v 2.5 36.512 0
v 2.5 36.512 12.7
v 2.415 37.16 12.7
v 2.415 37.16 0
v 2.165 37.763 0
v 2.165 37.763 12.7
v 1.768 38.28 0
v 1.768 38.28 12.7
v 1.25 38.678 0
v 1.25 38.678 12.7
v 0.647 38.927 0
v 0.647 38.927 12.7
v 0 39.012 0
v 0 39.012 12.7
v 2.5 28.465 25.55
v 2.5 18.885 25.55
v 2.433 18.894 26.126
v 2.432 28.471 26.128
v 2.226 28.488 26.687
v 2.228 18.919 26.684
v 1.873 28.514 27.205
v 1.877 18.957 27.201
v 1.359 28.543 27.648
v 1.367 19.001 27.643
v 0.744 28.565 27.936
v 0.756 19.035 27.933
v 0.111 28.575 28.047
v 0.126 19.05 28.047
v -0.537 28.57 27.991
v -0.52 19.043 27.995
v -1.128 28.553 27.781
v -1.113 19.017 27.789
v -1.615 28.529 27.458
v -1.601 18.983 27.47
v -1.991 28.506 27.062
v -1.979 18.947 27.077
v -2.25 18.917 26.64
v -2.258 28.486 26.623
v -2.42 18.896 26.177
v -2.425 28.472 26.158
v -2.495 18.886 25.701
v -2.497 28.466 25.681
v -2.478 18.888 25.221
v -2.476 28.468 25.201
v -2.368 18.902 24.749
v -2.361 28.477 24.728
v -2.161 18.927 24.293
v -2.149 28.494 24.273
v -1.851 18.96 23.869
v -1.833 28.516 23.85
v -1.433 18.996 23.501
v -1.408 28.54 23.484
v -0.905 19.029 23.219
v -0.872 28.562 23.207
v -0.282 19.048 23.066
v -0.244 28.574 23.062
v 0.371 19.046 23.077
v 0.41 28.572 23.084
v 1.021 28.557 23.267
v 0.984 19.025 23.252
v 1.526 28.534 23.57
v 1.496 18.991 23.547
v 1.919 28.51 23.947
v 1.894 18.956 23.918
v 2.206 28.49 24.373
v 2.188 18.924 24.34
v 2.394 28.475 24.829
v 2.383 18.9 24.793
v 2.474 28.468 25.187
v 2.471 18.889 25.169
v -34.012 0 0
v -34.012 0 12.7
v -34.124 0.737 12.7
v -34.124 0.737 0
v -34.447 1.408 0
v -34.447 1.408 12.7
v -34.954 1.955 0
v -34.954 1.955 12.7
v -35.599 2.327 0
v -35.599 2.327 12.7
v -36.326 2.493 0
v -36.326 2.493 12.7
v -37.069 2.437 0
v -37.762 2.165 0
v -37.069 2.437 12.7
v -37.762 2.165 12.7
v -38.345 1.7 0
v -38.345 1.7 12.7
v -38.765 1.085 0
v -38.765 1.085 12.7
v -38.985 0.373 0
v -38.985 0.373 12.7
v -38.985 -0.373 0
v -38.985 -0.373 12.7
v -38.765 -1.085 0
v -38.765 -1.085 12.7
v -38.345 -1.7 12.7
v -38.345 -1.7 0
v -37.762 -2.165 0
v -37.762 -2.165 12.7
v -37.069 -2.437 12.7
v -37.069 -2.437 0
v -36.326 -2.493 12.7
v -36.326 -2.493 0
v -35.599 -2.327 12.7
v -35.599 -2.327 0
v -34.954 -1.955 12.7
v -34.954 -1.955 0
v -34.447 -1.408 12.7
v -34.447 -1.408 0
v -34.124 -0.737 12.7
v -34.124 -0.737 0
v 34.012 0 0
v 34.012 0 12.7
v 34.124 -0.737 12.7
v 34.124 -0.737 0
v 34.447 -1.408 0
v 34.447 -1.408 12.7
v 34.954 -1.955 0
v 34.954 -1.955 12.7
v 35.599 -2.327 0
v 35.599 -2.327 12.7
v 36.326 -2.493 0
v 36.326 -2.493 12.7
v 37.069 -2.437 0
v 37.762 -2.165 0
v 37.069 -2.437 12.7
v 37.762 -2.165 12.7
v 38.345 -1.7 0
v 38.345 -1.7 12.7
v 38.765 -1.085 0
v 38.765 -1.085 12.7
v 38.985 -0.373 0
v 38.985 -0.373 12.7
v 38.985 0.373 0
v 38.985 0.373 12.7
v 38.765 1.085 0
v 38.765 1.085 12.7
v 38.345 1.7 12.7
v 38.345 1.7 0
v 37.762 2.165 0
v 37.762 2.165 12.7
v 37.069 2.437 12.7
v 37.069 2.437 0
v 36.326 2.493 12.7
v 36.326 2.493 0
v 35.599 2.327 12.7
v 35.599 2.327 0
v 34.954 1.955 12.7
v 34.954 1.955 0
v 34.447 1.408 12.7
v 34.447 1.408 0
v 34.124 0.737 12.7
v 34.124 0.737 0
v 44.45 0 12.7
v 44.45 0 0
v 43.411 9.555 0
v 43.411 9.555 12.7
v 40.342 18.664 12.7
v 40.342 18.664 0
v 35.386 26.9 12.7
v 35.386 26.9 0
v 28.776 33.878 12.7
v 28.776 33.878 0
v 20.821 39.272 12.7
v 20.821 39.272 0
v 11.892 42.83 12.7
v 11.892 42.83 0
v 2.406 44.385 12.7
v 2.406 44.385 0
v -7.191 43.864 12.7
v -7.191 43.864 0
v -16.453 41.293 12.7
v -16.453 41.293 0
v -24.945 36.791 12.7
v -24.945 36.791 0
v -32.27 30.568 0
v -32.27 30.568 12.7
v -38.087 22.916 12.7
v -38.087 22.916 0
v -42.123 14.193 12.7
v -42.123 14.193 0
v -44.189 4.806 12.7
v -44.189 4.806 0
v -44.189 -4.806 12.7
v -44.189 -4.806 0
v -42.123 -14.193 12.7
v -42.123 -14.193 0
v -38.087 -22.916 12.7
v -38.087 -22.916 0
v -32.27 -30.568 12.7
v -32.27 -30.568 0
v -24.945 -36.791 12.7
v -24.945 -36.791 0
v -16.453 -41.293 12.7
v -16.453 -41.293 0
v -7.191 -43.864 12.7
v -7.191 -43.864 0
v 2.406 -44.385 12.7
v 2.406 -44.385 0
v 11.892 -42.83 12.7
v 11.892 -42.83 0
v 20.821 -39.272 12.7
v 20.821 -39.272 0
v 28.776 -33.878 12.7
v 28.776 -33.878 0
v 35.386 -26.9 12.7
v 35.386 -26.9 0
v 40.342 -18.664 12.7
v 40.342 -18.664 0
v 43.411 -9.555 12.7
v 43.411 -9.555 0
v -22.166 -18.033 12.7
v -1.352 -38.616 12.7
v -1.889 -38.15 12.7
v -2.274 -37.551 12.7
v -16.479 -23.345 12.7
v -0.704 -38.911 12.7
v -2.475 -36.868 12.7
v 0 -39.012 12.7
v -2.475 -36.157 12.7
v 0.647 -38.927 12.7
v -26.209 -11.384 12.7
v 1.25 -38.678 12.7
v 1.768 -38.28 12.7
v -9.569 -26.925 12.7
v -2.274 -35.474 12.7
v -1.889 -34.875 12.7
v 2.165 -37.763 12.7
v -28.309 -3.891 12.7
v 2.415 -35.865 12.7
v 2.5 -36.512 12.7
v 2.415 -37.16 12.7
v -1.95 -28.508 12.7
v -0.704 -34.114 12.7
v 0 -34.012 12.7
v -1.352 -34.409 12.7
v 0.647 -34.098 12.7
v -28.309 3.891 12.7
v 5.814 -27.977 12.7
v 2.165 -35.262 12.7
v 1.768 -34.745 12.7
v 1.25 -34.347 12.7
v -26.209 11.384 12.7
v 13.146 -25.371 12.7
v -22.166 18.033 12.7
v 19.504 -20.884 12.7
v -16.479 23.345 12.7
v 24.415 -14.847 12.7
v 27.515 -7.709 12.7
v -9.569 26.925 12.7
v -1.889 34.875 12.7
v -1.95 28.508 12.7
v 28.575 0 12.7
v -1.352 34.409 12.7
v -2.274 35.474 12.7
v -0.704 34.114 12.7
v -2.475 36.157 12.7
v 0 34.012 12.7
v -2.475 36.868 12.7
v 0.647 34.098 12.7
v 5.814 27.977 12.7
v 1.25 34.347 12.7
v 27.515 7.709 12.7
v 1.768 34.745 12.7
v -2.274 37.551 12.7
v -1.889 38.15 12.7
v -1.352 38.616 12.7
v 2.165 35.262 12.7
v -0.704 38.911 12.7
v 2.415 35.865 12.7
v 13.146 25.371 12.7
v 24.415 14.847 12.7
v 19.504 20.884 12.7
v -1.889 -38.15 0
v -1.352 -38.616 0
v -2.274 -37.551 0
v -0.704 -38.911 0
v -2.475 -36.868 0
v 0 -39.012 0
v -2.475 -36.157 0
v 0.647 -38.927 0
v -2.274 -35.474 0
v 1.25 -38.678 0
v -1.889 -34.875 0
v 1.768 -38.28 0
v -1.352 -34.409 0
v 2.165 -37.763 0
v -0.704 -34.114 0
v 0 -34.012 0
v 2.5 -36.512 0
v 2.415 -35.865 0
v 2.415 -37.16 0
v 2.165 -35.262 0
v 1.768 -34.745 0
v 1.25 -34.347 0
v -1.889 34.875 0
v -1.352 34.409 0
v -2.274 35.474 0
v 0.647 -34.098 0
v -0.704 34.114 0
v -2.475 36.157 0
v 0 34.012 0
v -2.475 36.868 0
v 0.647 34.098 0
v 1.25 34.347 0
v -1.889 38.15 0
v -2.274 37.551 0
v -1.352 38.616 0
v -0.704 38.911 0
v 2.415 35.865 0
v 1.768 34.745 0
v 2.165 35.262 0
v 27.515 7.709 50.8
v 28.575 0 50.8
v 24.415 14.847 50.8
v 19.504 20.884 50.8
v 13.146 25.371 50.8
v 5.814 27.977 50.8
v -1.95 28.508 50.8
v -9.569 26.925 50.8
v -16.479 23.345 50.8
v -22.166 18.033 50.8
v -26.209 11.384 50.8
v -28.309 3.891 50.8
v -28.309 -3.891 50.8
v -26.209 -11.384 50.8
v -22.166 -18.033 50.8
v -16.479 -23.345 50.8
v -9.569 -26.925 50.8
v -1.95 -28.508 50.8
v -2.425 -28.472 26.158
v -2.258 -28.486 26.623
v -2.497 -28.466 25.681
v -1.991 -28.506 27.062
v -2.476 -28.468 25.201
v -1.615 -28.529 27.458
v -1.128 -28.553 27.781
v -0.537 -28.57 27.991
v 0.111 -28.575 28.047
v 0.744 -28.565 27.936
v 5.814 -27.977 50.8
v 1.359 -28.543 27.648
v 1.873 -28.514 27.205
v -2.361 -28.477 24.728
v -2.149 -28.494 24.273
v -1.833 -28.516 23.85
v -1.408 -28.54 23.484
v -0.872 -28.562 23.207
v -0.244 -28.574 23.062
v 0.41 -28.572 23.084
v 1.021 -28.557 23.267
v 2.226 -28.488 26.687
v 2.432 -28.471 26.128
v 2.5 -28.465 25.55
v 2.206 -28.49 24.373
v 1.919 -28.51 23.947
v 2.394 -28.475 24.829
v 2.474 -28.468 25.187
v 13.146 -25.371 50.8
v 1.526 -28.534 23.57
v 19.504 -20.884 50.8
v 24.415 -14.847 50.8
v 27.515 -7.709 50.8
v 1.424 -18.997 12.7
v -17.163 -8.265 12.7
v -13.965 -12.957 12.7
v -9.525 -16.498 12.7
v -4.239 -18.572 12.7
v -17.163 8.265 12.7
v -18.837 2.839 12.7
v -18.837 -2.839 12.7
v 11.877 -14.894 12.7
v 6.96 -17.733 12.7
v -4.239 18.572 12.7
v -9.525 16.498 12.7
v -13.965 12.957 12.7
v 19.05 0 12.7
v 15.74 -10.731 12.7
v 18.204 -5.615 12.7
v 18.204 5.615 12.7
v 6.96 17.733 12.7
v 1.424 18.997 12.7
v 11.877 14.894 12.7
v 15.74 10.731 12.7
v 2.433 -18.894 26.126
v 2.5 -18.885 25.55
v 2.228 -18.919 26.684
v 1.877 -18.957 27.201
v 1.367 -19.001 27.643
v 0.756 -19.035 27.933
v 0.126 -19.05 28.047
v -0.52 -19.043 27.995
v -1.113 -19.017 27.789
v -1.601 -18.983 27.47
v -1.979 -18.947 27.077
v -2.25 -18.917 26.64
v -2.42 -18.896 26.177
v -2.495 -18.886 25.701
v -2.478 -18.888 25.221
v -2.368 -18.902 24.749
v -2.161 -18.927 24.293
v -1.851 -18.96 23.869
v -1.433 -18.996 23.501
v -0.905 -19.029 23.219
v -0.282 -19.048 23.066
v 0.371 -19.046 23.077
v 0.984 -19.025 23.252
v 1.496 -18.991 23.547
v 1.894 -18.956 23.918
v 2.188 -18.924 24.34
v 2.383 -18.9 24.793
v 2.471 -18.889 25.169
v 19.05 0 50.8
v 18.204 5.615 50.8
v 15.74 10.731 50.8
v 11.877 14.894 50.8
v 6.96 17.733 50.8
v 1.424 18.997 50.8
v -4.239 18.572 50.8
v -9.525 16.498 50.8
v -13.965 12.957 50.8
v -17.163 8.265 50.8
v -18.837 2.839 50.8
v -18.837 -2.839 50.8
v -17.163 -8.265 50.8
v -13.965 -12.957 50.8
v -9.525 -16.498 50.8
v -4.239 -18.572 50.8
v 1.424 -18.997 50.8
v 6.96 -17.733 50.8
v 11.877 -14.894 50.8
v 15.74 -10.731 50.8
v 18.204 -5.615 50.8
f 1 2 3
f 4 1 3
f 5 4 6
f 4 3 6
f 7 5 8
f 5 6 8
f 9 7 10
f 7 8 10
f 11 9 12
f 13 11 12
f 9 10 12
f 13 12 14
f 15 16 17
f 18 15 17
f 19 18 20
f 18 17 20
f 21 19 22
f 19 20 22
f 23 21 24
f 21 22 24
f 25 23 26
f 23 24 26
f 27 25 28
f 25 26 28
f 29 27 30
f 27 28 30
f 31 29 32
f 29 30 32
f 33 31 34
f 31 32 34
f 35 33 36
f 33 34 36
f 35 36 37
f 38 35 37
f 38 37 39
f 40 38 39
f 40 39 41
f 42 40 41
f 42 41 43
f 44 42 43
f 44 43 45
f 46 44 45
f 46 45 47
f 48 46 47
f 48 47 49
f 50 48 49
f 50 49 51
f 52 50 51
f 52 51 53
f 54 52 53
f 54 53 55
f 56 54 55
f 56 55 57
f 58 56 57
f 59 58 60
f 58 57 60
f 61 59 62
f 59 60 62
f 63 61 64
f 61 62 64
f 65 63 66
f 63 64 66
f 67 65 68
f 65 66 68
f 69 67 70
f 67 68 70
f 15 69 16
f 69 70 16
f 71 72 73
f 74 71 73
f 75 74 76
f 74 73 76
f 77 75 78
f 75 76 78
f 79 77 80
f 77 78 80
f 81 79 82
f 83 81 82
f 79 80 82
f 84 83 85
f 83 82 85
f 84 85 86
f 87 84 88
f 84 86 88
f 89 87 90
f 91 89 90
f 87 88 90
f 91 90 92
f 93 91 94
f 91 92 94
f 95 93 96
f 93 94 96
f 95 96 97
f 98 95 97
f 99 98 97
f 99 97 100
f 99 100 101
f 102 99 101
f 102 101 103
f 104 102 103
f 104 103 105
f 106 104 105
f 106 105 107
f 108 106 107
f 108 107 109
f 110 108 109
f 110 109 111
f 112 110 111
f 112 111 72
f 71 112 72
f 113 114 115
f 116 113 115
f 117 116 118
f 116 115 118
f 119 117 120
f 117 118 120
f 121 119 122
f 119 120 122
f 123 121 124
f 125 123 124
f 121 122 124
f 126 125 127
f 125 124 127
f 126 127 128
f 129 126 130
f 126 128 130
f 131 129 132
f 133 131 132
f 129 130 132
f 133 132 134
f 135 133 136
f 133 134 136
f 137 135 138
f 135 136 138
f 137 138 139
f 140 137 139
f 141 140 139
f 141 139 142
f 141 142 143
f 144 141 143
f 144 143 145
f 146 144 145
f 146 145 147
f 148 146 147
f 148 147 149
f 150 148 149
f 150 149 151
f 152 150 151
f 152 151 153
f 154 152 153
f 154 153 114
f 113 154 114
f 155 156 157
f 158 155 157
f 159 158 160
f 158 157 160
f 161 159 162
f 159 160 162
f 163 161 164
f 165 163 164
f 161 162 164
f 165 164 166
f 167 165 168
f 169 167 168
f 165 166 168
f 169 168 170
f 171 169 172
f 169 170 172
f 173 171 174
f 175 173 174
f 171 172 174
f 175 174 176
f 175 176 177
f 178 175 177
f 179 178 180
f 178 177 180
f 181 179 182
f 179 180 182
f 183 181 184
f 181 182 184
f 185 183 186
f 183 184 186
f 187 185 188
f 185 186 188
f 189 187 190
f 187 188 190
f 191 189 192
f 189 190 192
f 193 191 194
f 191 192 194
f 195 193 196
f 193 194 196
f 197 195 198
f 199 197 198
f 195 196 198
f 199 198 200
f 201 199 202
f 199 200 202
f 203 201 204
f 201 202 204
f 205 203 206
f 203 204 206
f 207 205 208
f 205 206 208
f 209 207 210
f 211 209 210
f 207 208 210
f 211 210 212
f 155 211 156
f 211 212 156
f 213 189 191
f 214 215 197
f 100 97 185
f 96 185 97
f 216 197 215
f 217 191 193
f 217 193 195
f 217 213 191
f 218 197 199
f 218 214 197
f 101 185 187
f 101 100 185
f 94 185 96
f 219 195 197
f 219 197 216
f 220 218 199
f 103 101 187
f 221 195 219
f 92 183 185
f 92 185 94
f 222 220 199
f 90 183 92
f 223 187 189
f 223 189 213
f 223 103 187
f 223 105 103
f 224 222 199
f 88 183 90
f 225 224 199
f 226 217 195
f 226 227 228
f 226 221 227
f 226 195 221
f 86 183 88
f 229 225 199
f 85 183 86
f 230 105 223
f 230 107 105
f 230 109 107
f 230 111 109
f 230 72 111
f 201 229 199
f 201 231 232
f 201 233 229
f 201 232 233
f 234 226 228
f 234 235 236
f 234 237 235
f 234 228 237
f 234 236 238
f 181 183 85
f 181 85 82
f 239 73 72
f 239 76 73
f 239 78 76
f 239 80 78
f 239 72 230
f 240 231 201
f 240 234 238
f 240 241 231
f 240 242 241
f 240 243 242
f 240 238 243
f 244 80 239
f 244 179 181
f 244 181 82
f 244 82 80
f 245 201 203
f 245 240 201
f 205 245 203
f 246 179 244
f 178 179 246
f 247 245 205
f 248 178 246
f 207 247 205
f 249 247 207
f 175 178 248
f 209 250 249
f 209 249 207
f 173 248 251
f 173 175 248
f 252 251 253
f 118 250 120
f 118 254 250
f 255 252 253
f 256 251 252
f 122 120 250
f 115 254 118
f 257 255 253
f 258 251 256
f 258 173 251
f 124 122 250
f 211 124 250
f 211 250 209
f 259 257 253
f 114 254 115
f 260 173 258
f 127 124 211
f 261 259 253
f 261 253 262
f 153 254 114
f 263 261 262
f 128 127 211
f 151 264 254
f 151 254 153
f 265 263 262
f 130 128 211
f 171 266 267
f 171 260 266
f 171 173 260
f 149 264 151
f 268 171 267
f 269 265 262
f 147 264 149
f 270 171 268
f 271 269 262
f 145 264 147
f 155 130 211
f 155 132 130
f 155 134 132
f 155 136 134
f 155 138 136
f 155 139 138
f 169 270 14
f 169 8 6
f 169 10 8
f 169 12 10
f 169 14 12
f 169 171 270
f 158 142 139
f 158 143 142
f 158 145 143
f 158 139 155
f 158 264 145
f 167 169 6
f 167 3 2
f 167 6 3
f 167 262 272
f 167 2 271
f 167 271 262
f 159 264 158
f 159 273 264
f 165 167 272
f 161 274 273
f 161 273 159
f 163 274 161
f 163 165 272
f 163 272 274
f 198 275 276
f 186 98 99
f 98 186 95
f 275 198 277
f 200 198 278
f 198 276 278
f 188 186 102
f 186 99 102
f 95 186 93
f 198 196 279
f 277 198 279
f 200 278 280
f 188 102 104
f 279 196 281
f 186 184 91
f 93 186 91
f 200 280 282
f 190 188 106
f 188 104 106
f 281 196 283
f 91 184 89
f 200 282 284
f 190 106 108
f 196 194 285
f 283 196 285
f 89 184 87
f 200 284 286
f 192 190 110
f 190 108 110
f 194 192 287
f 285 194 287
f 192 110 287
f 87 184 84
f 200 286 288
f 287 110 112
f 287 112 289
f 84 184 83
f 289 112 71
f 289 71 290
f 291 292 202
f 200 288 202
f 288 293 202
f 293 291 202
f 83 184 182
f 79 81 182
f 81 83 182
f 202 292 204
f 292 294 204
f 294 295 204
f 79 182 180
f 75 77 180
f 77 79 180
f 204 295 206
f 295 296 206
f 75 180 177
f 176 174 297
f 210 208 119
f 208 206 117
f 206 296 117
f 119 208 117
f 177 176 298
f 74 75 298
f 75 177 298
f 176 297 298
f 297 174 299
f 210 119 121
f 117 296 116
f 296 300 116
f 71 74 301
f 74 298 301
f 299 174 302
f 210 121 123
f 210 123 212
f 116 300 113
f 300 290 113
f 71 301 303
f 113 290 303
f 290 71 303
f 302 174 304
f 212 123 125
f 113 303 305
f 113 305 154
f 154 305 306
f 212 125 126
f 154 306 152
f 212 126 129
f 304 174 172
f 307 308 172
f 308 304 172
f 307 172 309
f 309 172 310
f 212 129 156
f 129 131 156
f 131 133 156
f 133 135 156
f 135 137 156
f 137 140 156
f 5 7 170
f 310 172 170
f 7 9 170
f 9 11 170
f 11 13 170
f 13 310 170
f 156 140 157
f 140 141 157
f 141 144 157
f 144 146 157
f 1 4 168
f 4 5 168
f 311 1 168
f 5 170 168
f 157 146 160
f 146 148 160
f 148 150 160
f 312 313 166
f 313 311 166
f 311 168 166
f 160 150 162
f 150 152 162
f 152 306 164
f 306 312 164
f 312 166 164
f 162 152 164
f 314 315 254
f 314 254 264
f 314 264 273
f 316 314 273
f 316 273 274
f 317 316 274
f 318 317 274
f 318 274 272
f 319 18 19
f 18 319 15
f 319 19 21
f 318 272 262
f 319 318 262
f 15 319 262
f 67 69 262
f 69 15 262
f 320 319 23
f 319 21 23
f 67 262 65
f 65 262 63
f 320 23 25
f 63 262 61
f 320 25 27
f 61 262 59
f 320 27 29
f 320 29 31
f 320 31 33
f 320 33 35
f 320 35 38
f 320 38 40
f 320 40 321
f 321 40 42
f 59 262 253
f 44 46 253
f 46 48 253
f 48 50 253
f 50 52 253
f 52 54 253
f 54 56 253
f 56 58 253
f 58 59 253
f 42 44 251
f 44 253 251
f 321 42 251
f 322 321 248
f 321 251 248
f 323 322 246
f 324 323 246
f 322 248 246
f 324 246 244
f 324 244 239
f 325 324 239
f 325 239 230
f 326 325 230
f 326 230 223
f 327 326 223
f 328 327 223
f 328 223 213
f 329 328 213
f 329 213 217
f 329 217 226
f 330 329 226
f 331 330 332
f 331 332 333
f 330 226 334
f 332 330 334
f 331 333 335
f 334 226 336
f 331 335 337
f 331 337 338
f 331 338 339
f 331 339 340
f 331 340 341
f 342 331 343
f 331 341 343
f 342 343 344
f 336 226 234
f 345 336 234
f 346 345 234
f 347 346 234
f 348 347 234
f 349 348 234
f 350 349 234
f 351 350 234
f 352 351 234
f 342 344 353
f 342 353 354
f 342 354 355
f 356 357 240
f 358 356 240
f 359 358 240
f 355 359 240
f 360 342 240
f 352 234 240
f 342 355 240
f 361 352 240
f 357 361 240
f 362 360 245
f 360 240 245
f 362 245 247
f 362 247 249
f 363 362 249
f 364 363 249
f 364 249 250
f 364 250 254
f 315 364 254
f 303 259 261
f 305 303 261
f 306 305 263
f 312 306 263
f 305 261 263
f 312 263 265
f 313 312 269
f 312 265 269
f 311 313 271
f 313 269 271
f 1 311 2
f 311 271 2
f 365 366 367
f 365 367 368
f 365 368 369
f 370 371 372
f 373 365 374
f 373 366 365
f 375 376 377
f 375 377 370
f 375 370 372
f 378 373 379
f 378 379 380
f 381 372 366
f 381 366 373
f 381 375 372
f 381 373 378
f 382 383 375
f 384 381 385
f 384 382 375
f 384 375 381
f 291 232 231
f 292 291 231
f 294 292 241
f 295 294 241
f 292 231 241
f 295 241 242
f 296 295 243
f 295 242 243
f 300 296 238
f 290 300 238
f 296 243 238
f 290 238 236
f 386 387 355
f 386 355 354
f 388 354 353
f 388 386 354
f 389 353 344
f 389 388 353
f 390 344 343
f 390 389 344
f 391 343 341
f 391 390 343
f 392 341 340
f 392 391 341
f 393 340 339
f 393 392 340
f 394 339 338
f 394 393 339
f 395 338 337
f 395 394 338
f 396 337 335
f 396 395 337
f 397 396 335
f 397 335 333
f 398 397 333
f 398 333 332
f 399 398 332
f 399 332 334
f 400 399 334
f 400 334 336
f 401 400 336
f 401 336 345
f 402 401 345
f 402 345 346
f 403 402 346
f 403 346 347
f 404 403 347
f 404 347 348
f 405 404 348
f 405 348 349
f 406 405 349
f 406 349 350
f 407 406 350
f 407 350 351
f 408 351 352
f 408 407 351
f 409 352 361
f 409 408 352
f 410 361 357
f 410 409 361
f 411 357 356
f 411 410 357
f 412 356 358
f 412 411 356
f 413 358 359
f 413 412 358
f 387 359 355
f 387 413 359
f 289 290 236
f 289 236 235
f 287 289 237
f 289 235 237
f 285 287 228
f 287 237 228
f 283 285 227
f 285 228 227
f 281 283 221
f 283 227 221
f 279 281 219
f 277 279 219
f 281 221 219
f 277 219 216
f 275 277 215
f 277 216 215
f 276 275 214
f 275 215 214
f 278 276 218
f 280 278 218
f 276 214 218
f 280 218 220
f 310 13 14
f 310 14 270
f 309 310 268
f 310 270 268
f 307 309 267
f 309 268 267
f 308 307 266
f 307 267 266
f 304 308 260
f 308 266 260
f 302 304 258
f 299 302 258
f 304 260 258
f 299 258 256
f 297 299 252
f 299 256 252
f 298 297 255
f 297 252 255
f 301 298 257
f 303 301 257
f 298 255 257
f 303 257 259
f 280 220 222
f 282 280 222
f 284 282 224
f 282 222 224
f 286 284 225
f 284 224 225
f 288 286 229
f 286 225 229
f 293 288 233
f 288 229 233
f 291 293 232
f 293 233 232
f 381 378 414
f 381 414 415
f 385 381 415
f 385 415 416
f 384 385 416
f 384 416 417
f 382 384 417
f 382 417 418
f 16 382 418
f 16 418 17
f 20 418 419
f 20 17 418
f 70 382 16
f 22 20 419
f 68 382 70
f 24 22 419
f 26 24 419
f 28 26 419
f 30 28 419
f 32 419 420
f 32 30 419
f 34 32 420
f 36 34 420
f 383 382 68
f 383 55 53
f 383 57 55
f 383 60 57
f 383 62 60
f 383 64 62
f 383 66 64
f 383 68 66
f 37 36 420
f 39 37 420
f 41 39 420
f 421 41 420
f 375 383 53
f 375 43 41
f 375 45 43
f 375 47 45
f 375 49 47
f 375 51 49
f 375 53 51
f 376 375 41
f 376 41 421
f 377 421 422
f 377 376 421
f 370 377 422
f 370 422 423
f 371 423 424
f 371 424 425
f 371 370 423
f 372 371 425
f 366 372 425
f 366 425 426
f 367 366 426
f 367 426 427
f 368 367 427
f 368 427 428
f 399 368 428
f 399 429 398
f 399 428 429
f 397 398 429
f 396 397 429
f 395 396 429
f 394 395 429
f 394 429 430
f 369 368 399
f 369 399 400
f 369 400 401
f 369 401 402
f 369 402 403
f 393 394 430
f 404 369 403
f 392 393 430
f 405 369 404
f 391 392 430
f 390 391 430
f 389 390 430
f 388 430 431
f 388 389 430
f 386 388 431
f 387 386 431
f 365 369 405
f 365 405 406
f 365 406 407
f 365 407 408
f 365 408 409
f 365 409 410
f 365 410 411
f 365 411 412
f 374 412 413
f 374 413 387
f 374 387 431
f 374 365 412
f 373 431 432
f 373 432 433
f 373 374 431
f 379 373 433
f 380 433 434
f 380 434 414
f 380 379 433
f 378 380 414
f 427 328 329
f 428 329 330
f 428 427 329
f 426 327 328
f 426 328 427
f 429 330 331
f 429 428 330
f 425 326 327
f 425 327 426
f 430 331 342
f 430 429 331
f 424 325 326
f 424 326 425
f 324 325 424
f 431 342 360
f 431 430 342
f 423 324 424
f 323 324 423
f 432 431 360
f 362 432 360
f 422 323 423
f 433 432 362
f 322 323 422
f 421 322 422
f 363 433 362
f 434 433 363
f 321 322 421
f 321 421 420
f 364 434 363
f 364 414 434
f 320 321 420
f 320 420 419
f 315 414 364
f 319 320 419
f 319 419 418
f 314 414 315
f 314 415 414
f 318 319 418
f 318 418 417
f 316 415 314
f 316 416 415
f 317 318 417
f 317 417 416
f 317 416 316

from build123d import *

# Parameters (mm, degrees)
F0_R     = 44.45
F1_DEPTH = 12.7
F2_R     = 28.575
F2_R_2   = 19.05
F3_DEPTH = 38.1
F5_DEPTH = 12.701
F6_R     = 2.5
F7_DEPTH = 44.451
F8_DEPTH = 44.451


with BuildPart() as f1:
    # F0 (on Top) → F1 (new body)
    with BuildSketch(Plane.XY):
        Circle(F0_R)
    extrude(amount=F1_DEPTH)

    # F2 (on face) → F3 (join)
    with BuildSketch(Plane.XY.offset(12.7)):
        Circle(F2_R)
        Circle(F2_R_2, mode=Mode.SUBTRACT)
    extrude(amount=F3_DEPTH)

    # F4 (on face) → F5 (cut, through all)
    with BuildSketch(Plane.XY.offset(12.7)):
        with BuildLine():
            Line((0, -36.5125), (0, -34.0125))
            ThreePointArc((0, -34.0125), (-2.5, -36.5125), (0, -39.0125))
            Line((0, -39.0125), (0, -36.5125))
        make_face()
        with BuildLine():
            ThreePointArc((2.5, -36.5125), (1.767767, -34.744733), (0, -34.0125))
            Line((0, -34.0125), (0, -36.5125))
            Line((0, -36.5125), (0, -39.0125))
            ThreePointArc((0, -39.0125), (1.767767, -38.280267), (2.5, -36.5125))
        make_face()
        with BuildLine():
            ThreePointArc((-39.0125, 0), (-36.5125, -2.5), (-34.0125, 0))
            Line((-34.0125, 0), (-36.5125, 0))
            Line((-36.5125, 0), (-39.0125, 0))
        make_face()
        with BuildLine():
            Line((-36.5125, 0), (-34.0125, 0))
            ThreePointArc((-34.0125, 0), (-36.5125, 2.5), (-39.0125, 0))
            Line((-39.0125, 0), (-36.5125, 0))
        make_face()
        with BuildLine():
            ThreePointArc((0, 39.0125), (-2.5, 36.5125), (0, 34.0125))
            Line((0, 34.0125), (0, 36.5125))
            Line((0, 36.5125), (0, 39.0125))
        make_face()
        with BuildLine():
            Line((34.0125, 0), (36.5125, 0))
            Line((36.5125, 0), (39.0125, 0))
            ThreePointArc((39.0125, 0), (36.5125, 2.5), (34.0125, 0))
        make_face()
        with BuildLine():
            Line((39.0125, 0), (36.5125, 0))
            Line((36.5125, 0), (34.0125, 0))
            ThreePointArc((34.0125, 0), (36.5125, -2.5), (39.0125, 0))
        make_face()
        with BuildLine():
            Line((0, 36.5125), (0, 34.0125))
            ThreePointArc((0, 34.0125), (1.767767, 34.744733), (2.5, 36.5125))
            ThreePointArc((2.5, 36.5125), (1.767767, 38.280267), (0, 39.0125))
            Line((0, 39.0125), (0, 36.5125))
        make_face()
    extrude(amount=-F5_DEPTH, mode=Mode.SUBTRACT)

    # F6 (on Front) → F7 (cut, through all)
    with BuildSketch(Plane.XZ):
        with Locations((0, 25.549719)):
            Circle(F6_R)
    extrude(amount=-F7_DEPTH, mode=Mode.SUBTRACT)

    # F6 (on Front) → F8 (cut, through all)
    with BuildSketch(Plane.XZ):
        with Locations((0, 25.549719)):
            Circle(F6_R)
    extrude(amount=F8_DEPTH, mode=Mode.SUBTRACT)


solid = f1.part
